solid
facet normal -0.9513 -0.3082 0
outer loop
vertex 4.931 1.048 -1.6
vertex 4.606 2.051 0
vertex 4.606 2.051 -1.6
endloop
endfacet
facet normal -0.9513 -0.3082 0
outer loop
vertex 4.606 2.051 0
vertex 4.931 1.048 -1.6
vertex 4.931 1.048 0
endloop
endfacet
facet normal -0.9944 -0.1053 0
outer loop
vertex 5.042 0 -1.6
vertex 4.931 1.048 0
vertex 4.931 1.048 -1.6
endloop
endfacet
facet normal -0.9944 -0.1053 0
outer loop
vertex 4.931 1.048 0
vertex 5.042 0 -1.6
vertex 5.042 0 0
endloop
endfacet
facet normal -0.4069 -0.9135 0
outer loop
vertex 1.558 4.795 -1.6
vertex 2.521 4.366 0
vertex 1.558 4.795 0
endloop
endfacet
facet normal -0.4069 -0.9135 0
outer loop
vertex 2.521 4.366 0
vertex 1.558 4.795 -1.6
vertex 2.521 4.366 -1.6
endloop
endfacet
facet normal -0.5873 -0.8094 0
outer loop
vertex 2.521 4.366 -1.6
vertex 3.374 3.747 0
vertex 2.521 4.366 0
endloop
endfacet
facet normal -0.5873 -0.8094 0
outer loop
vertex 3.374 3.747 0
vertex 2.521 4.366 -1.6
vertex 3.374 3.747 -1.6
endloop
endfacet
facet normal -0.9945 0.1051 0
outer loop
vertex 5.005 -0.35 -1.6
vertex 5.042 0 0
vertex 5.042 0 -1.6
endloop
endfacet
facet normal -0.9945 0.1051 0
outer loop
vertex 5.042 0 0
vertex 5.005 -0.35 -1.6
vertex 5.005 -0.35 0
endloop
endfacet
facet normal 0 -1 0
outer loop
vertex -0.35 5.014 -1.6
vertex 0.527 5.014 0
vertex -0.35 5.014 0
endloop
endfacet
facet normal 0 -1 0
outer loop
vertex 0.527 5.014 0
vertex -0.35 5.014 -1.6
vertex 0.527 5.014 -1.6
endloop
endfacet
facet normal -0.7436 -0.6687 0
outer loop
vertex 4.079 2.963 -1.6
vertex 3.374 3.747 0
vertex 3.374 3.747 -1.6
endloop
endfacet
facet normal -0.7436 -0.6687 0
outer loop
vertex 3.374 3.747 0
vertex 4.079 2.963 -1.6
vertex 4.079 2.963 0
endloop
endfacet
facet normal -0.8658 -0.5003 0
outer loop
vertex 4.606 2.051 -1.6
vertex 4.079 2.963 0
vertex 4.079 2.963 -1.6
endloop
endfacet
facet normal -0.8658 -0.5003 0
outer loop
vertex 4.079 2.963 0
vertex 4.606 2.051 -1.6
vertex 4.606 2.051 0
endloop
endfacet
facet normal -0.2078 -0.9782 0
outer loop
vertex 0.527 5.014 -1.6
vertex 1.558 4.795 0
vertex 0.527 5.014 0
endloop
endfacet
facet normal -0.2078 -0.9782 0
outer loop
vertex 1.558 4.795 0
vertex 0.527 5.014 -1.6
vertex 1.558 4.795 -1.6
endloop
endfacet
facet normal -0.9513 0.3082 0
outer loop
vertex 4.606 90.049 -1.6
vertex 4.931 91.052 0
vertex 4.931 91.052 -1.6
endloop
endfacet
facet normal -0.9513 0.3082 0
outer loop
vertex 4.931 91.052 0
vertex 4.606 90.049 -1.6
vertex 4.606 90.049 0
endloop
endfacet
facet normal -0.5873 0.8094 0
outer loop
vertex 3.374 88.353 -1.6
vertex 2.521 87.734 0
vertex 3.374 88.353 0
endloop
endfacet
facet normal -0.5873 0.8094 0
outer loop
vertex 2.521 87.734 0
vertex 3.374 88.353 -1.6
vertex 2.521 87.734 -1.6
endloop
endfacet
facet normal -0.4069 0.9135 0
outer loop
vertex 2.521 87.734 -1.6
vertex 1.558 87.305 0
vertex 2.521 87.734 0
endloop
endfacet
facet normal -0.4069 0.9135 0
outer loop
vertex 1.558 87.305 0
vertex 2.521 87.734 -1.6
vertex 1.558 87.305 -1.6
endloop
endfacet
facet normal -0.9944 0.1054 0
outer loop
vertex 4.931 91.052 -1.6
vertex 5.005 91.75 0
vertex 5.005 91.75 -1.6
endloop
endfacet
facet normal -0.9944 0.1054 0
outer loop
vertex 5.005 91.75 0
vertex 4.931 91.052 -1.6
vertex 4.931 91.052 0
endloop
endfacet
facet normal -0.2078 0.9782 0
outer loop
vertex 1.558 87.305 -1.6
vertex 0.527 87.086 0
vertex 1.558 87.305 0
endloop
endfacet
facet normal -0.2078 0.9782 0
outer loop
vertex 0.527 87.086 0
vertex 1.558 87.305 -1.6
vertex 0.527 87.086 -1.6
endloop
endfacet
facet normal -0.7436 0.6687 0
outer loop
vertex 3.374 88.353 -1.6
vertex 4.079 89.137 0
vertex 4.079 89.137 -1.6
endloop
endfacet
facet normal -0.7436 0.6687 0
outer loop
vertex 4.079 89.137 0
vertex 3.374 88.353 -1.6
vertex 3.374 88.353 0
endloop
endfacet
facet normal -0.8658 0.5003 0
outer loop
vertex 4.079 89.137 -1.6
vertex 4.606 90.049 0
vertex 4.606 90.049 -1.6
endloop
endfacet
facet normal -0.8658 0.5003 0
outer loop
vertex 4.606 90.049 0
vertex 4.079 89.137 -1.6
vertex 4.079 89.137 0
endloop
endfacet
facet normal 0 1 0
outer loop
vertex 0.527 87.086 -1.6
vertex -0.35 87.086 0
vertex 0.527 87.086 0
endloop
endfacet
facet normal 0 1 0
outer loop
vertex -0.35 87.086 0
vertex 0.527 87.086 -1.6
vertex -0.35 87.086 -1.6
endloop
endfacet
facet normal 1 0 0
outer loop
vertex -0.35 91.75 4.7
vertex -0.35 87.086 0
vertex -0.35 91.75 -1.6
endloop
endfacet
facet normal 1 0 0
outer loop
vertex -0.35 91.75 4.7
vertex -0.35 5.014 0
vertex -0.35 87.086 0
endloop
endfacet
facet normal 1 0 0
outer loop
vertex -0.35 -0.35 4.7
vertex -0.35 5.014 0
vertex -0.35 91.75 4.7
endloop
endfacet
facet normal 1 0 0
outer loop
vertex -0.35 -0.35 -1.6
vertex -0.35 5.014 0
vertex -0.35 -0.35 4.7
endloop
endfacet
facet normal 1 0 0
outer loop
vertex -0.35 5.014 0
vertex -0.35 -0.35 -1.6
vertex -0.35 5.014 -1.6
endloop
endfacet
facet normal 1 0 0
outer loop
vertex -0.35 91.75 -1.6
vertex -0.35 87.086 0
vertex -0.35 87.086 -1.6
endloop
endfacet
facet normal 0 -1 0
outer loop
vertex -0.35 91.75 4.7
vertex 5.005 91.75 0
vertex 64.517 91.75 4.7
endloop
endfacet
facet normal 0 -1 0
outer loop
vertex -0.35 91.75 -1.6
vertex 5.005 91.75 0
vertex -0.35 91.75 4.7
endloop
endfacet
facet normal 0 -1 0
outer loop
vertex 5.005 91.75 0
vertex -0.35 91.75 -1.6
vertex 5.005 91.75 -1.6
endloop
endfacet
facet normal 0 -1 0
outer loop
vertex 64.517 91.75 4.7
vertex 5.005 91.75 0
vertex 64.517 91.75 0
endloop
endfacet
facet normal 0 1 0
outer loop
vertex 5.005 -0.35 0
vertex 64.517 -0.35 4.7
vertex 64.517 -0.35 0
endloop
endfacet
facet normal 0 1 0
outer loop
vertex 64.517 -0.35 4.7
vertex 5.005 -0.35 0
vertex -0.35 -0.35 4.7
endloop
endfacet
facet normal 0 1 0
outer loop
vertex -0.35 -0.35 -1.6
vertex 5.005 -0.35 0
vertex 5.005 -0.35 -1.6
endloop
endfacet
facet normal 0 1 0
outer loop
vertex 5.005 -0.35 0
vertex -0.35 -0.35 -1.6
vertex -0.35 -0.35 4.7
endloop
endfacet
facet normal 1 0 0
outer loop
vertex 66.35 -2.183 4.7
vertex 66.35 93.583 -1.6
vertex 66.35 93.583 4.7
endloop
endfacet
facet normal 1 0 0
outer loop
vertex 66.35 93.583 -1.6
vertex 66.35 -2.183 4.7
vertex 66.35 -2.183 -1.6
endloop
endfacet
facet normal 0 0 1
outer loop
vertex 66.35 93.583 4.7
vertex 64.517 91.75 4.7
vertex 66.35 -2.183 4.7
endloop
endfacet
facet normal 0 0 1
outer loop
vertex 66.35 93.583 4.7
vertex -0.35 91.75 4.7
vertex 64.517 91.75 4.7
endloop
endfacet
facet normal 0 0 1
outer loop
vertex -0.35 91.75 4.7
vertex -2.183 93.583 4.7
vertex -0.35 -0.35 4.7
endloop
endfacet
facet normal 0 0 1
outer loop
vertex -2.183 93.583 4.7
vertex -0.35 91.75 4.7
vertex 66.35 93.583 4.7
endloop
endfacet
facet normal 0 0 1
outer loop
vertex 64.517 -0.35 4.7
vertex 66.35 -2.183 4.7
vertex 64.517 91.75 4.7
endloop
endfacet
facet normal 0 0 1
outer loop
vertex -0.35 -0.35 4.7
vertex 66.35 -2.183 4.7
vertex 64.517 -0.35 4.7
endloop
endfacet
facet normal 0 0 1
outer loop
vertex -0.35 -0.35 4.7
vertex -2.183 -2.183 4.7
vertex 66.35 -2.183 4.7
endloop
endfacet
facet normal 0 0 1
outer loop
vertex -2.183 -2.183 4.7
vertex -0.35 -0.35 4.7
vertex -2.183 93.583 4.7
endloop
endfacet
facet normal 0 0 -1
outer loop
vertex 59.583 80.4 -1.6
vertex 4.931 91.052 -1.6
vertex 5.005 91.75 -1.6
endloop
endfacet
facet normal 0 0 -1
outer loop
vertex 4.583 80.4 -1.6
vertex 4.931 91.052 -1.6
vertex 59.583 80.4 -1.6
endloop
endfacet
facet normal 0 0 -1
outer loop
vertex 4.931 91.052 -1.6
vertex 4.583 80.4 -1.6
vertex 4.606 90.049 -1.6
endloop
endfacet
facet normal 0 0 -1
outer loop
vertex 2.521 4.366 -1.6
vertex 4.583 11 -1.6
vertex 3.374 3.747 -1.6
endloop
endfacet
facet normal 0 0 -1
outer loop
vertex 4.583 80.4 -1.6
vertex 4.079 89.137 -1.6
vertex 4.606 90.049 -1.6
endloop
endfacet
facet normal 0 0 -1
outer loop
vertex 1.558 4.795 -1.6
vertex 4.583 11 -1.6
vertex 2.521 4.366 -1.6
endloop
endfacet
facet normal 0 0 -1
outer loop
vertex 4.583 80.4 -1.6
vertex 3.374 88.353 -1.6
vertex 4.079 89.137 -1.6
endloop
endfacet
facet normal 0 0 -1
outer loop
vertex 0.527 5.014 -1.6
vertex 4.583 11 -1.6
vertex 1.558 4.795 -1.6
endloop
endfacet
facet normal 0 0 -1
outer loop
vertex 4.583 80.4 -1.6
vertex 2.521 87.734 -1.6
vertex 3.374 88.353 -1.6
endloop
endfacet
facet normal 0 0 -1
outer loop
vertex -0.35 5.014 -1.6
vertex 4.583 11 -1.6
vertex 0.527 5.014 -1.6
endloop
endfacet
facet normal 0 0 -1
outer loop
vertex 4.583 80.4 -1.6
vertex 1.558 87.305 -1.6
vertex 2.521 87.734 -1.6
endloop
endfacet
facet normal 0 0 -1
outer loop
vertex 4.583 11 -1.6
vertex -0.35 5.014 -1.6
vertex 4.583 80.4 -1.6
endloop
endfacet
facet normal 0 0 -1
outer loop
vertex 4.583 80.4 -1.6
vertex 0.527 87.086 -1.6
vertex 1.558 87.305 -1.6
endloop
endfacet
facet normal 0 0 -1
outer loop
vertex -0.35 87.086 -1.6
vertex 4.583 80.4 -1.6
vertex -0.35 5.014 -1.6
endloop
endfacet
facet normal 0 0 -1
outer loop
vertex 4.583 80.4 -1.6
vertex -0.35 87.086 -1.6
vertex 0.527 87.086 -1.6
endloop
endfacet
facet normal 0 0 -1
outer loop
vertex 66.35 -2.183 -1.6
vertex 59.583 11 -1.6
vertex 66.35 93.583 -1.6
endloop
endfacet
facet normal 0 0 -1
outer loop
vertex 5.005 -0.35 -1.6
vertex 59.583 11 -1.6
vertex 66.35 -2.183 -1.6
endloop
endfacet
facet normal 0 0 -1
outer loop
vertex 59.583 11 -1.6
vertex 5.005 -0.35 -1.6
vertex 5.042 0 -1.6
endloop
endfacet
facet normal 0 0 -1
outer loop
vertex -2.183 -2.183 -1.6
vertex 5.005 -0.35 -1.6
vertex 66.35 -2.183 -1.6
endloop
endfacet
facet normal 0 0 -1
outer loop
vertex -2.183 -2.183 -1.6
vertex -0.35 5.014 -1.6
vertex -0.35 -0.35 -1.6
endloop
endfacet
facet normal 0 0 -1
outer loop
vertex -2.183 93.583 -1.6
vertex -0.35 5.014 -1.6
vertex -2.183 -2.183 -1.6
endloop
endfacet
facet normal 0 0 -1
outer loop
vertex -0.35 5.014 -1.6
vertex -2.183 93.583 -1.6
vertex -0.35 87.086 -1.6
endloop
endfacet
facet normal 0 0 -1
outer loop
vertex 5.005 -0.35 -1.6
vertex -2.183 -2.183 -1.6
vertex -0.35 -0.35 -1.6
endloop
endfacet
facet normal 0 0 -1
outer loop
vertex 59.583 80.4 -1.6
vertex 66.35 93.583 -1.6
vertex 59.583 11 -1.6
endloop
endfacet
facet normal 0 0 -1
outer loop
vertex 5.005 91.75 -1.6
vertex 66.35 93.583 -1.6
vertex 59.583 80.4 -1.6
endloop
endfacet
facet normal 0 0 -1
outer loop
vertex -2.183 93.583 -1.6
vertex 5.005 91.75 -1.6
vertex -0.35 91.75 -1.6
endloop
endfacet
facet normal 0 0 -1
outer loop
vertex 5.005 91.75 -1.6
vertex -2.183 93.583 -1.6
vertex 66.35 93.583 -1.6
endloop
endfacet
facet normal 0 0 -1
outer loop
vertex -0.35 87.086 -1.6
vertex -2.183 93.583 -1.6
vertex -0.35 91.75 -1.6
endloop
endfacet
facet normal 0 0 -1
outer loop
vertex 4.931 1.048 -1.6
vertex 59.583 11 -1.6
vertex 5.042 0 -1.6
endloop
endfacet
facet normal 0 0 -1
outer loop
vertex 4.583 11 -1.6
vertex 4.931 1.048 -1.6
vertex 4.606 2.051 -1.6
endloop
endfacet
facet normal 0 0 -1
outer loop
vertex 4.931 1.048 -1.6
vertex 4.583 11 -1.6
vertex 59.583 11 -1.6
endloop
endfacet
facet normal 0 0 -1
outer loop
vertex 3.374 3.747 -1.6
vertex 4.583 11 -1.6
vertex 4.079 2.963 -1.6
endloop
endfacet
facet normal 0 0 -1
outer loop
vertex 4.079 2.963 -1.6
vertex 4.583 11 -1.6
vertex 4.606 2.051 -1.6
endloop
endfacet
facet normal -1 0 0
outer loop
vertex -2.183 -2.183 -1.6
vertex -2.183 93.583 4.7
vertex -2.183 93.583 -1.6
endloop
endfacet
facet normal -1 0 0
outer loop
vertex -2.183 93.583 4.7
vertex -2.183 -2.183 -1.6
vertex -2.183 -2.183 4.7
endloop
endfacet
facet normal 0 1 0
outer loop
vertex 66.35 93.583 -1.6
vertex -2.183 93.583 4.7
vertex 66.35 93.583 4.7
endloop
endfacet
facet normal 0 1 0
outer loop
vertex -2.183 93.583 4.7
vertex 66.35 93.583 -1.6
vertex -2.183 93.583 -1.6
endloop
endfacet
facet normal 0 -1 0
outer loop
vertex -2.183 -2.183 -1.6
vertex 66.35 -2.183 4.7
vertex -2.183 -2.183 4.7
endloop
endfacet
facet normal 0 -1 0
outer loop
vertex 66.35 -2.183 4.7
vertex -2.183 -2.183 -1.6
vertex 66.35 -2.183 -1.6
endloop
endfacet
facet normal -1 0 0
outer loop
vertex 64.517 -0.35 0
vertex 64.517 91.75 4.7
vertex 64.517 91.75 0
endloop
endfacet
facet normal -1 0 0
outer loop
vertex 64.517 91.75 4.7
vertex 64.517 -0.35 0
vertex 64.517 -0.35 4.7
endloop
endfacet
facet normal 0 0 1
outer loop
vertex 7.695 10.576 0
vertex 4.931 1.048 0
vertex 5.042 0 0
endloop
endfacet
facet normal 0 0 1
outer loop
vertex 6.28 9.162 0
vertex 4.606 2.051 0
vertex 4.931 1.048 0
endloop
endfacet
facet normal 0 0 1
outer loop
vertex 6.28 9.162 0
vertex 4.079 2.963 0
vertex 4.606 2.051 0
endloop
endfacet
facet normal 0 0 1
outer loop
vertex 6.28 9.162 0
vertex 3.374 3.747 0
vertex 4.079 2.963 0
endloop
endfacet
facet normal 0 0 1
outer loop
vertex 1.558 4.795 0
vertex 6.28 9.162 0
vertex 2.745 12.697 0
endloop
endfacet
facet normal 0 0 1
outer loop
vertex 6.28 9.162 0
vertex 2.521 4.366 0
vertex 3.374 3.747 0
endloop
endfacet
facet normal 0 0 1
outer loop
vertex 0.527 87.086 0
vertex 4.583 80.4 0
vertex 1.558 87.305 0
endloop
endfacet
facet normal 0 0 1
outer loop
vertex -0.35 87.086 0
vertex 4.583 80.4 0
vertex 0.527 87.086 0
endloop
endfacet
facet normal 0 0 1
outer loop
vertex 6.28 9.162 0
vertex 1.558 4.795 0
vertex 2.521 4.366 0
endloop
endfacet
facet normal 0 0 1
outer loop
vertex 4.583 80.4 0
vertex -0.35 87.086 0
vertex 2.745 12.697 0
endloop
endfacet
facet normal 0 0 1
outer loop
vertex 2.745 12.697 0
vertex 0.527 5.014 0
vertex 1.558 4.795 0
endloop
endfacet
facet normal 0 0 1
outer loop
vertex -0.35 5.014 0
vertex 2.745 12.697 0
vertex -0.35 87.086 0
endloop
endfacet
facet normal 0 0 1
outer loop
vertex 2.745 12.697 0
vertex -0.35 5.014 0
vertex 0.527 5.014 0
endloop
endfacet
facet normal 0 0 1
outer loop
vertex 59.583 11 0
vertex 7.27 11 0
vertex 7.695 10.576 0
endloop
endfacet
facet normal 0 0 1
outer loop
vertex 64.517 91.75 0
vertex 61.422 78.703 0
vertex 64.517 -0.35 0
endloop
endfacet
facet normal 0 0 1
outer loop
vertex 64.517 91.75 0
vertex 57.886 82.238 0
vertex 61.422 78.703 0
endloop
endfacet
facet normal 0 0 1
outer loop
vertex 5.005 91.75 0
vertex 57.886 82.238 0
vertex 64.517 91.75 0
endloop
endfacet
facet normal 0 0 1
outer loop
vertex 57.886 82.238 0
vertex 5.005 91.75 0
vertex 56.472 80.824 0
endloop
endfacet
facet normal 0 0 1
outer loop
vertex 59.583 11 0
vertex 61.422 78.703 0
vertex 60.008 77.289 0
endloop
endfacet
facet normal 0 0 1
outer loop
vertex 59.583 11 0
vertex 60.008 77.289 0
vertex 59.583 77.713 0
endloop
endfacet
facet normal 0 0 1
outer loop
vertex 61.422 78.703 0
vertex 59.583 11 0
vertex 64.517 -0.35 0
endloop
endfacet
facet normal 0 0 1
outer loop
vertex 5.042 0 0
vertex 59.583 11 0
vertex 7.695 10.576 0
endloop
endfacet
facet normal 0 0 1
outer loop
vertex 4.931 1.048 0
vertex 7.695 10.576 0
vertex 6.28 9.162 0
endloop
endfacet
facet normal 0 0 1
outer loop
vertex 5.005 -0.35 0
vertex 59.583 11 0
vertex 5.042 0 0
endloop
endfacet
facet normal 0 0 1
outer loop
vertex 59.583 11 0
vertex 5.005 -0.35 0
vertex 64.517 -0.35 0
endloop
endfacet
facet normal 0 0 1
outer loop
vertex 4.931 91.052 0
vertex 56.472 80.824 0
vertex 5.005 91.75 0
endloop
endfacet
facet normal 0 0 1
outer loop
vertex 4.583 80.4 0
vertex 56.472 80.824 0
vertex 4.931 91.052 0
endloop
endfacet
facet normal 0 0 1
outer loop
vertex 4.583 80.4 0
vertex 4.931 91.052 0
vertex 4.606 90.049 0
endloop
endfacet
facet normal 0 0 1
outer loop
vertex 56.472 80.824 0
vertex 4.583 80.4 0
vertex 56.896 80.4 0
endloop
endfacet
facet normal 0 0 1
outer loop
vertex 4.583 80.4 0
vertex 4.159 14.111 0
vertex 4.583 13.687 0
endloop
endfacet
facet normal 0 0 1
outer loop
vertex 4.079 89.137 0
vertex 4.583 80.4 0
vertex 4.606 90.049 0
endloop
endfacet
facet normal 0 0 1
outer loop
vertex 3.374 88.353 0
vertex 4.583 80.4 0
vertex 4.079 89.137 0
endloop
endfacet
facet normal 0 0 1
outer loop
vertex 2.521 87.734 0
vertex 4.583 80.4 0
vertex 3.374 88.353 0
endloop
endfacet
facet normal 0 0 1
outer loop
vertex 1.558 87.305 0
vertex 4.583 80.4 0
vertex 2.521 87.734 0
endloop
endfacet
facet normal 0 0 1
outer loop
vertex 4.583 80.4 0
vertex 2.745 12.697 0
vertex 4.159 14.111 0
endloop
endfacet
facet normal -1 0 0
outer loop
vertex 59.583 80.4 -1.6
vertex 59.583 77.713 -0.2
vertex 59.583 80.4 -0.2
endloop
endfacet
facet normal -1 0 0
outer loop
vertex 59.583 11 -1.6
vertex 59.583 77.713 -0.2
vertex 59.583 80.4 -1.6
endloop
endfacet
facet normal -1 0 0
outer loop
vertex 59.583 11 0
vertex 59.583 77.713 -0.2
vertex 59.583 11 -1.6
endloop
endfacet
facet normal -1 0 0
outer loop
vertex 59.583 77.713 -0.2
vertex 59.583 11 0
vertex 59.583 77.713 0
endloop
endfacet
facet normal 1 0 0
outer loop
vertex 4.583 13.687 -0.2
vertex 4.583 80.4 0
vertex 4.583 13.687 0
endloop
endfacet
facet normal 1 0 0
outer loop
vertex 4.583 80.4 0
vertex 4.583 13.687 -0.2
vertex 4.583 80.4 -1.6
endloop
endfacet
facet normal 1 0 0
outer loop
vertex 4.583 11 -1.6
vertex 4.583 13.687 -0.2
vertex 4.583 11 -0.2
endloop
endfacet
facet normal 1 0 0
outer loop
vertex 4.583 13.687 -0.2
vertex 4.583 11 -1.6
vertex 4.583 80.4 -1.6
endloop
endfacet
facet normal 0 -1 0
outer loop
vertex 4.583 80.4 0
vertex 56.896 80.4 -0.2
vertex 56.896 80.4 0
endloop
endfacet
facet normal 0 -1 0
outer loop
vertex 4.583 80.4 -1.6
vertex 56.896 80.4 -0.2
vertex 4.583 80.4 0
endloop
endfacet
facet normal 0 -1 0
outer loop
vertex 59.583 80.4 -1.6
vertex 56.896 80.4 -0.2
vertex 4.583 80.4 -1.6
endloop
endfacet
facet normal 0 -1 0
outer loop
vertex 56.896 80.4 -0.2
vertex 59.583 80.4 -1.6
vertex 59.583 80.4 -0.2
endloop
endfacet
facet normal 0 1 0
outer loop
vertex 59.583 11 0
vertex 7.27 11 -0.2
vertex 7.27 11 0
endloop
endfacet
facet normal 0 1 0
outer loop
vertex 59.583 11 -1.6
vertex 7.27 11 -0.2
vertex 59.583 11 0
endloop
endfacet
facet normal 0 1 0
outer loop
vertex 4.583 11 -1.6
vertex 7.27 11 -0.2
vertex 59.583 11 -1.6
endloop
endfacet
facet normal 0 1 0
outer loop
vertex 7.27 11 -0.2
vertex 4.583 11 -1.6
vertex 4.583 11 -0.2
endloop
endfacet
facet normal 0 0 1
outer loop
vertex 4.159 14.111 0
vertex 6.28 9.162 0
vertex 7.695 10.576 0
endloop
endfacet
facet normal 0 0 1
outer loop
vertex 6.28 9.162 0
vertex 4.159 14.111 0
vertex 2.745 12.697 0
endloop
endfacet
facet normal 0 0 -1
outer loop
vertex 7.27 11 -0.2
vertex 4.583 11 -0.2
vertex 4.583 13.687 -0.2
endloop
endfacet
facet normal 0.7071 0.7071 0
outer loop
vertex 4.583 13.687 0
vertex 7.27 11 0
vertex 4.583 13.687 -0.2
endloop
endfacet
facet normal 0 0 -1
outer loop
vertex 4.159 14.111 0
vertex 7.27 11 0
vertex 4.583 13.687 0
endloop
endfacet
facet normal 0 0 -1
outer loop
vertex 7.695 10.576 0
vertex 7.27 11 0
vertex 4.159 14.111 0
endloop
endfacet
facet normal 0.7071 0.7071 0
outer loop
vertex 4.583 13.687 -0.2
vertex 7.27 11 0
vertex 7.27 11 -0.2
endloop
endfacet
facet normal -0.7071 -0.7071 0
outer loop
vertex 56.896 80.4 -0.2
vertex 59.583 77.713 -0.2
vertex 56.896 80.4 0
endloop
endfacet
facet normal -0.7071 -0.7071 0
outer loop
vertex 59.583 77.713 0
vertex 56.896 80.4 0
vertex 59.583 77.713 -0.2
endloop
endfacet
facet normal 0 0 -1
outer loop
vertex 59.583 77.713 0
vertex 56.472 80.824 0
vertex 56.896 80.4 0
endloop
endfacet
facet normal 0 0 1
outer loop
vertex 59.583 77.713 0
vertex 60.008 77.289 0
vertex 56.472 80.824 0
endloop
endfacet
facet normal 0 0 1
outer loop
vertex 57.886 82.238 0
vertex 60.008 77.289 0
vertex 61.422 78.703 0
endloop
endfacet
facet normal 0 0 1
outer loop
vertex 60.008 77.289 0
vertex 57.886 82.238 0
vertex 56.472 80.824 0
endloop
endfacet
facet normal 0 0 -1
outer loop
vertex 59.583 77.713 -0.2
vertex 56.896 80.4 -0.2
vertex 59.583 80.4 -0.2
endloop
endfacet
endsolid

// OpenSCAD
/* [Global] */

/*[Picture Size]*/

//Picture width in mm
drawingWidth = 54;
//Picture length in mm
drawingHeight = 68.4;
//Picture Thickness, default=0.6
pthick = 0.6;       

/*[Frame Setting]*/

//Control frame edge on width
Widthindex = 12;    //[6:30]
//Control frame edge on length
Lengthindex = 5;    //[6:30]
//Thickness of the outter frame
blackframethick = 3;    //[2:6]
//Height of levelup the frame
wallmount = 6;
//Need to the levelup back stand?
levelup = 0;  //[0:Yes,1:No]
//3D object rendering
object = 3;  //[0:ALL,1:Innerframe, 2:Outerframe+Levelup, 3:Outerframe, 4:Levelup ]  



/* [Hidden] */

holeoffset = 3;
whiteoutthick = 2.2;  ///2.5-3

blackframespace = 0.7;  

pwidth = drawingWidth +1;
pheight = drawingHeight+1;

whitewidth = pwidth/Widthindex;      //6
whiteheight = pwidth/Lengthindex;

blackframeW = whiteheight/blackframethick;

backthick = pthick+1;    

//////////////////////////////


totalW = pwidth + whitewidth*2;  
totalH = pheight + whiteheight*2;  

holeW = pwidth-holeoffset;
holeH = pheight-holeoffset;

/////Inner Frame////
if (object == 0 || object == 1 ){
difference(){


cube([totalW  , totalH ,whiteoutthick]);
    
translate([(totalW-holeW)/2,(totalH-holeH)/2,-whiteoutthick])
cube([holeW,holeH,whiteoutthick*4]);
    
translate([(totalW-(holeW+whitewidth/3))/2,(totalH-(holeH+whitewidth/3))/2,whiteoutthick*0.6])
cube([holeW+whitewidth/3,holeH+whitewidth/3,whiteoutthick*4]);


}
}
/////Outer Frame////
if (object == 0 || object == 2 || object == 3){
translate([0,0,-backthick]){
difference(){

  translate([-(blackframeW+blackframespace)/2,-(blackframeW+blackframespace)/2,0]) 
 cube([totalW+blackframeW+blackframespace  , totalH+blackframeW+blackframespace ,whiteoutthick+backthick+2.5]);  
    
    translate([-blackframespace/2,-blackframespace/2,backthick])
   cube([totalW+blackframespace,totalH+blackframespace,whiteoutthick*4]); 
    
    if (levelup==0)     //REQUIRE levelup
        translate([(totalW-pwidth)/2,(totalH-pheight)/2,backthick-pthick-backthick])  
   cube([pwidth,pheight,whiteoutthick*4]);
    
    
    if (levelup==1)  //NO levelup
   translate([(totalW-pwidth)/2,(totalH-pheight)/2,backthick-pthick])  
   cube([pwidth,pheight,whiteoutthick*4]);
  
 
    
    
translate([0,0,-2])
intersection() {
    
   translate([-blackframespace/2,-blackframespace/2,0])
   cube([totalW+blackframespace,totalH+blackframespace,whiteoutthick*6]); 
    
    union(){
    cylinder(h = 5, r=whitewidth*1.1, $fn=30);
    translate([0,totalH+blackframespace,0])
    cylinder(h = 5, r=whitewidth*1.1, $fn=30);
    }
}   
}
}
////lock the paper
translate([whitewidth,whiteheight,0])
rotate([0,0,45])
translate([-0.1,-2.5,-0.2])
cube([2,5,0.2]);

translate([whitewidth+pwidth,whiteheight+pheight,0])
rotate([0,0,225])
translate([-0.1,-2.5,-0.2])
cube([2,5,0.2]);


}

///Level Up///
if (object == 0 || object == 2 || object == 4 )
    if(levelup==0)
{
translate([0,0,-10]){
translate([(totalW-(pwidth-1))/2,(totalH-(pheight-1))/2,-backthick])  
cube([ pwidth-1, pheight-1,1]);
    
difference(){
hull()
    {
translate([(totalW-pwidth-1)/2,(totalH-pheight-1)/2,-wallmount-backthick])
    translate([0,0,wallmount-1])
cube([ pwidth+1,pheight+1,0.01]);
        
        
translate([(totalW-pwidth+1)/2,(totalH-pheight+1)/2,-wallmount-backthick])
    translate([0,0,wallmount])
cube([ pwidth-1,pheight-1,0.01]);
        
    
translate([(totalW-totalW/2)/2,(totalH-totalH/2)/2,-wallmount-backthick])
cube([ totalW/2,totalH/2,0.01]); 
    }



translate([0,0,-wallmount/2])
intersection() {
    
   translate([-blackframespace/2,-blackframespace/2,0])
   cube([totalW+blackframespace,totalH+blackframespace,whiteoutthick*6]); 
    
    union(){
    cylinder(h = 5, r=whitewidth*1.1, $fn=30);
    translate([0,totalH+blackframespace,0])
    cylinder(h = 5, r=whitewidth*1.1, $fn=30);
    }
}
}
}
}
